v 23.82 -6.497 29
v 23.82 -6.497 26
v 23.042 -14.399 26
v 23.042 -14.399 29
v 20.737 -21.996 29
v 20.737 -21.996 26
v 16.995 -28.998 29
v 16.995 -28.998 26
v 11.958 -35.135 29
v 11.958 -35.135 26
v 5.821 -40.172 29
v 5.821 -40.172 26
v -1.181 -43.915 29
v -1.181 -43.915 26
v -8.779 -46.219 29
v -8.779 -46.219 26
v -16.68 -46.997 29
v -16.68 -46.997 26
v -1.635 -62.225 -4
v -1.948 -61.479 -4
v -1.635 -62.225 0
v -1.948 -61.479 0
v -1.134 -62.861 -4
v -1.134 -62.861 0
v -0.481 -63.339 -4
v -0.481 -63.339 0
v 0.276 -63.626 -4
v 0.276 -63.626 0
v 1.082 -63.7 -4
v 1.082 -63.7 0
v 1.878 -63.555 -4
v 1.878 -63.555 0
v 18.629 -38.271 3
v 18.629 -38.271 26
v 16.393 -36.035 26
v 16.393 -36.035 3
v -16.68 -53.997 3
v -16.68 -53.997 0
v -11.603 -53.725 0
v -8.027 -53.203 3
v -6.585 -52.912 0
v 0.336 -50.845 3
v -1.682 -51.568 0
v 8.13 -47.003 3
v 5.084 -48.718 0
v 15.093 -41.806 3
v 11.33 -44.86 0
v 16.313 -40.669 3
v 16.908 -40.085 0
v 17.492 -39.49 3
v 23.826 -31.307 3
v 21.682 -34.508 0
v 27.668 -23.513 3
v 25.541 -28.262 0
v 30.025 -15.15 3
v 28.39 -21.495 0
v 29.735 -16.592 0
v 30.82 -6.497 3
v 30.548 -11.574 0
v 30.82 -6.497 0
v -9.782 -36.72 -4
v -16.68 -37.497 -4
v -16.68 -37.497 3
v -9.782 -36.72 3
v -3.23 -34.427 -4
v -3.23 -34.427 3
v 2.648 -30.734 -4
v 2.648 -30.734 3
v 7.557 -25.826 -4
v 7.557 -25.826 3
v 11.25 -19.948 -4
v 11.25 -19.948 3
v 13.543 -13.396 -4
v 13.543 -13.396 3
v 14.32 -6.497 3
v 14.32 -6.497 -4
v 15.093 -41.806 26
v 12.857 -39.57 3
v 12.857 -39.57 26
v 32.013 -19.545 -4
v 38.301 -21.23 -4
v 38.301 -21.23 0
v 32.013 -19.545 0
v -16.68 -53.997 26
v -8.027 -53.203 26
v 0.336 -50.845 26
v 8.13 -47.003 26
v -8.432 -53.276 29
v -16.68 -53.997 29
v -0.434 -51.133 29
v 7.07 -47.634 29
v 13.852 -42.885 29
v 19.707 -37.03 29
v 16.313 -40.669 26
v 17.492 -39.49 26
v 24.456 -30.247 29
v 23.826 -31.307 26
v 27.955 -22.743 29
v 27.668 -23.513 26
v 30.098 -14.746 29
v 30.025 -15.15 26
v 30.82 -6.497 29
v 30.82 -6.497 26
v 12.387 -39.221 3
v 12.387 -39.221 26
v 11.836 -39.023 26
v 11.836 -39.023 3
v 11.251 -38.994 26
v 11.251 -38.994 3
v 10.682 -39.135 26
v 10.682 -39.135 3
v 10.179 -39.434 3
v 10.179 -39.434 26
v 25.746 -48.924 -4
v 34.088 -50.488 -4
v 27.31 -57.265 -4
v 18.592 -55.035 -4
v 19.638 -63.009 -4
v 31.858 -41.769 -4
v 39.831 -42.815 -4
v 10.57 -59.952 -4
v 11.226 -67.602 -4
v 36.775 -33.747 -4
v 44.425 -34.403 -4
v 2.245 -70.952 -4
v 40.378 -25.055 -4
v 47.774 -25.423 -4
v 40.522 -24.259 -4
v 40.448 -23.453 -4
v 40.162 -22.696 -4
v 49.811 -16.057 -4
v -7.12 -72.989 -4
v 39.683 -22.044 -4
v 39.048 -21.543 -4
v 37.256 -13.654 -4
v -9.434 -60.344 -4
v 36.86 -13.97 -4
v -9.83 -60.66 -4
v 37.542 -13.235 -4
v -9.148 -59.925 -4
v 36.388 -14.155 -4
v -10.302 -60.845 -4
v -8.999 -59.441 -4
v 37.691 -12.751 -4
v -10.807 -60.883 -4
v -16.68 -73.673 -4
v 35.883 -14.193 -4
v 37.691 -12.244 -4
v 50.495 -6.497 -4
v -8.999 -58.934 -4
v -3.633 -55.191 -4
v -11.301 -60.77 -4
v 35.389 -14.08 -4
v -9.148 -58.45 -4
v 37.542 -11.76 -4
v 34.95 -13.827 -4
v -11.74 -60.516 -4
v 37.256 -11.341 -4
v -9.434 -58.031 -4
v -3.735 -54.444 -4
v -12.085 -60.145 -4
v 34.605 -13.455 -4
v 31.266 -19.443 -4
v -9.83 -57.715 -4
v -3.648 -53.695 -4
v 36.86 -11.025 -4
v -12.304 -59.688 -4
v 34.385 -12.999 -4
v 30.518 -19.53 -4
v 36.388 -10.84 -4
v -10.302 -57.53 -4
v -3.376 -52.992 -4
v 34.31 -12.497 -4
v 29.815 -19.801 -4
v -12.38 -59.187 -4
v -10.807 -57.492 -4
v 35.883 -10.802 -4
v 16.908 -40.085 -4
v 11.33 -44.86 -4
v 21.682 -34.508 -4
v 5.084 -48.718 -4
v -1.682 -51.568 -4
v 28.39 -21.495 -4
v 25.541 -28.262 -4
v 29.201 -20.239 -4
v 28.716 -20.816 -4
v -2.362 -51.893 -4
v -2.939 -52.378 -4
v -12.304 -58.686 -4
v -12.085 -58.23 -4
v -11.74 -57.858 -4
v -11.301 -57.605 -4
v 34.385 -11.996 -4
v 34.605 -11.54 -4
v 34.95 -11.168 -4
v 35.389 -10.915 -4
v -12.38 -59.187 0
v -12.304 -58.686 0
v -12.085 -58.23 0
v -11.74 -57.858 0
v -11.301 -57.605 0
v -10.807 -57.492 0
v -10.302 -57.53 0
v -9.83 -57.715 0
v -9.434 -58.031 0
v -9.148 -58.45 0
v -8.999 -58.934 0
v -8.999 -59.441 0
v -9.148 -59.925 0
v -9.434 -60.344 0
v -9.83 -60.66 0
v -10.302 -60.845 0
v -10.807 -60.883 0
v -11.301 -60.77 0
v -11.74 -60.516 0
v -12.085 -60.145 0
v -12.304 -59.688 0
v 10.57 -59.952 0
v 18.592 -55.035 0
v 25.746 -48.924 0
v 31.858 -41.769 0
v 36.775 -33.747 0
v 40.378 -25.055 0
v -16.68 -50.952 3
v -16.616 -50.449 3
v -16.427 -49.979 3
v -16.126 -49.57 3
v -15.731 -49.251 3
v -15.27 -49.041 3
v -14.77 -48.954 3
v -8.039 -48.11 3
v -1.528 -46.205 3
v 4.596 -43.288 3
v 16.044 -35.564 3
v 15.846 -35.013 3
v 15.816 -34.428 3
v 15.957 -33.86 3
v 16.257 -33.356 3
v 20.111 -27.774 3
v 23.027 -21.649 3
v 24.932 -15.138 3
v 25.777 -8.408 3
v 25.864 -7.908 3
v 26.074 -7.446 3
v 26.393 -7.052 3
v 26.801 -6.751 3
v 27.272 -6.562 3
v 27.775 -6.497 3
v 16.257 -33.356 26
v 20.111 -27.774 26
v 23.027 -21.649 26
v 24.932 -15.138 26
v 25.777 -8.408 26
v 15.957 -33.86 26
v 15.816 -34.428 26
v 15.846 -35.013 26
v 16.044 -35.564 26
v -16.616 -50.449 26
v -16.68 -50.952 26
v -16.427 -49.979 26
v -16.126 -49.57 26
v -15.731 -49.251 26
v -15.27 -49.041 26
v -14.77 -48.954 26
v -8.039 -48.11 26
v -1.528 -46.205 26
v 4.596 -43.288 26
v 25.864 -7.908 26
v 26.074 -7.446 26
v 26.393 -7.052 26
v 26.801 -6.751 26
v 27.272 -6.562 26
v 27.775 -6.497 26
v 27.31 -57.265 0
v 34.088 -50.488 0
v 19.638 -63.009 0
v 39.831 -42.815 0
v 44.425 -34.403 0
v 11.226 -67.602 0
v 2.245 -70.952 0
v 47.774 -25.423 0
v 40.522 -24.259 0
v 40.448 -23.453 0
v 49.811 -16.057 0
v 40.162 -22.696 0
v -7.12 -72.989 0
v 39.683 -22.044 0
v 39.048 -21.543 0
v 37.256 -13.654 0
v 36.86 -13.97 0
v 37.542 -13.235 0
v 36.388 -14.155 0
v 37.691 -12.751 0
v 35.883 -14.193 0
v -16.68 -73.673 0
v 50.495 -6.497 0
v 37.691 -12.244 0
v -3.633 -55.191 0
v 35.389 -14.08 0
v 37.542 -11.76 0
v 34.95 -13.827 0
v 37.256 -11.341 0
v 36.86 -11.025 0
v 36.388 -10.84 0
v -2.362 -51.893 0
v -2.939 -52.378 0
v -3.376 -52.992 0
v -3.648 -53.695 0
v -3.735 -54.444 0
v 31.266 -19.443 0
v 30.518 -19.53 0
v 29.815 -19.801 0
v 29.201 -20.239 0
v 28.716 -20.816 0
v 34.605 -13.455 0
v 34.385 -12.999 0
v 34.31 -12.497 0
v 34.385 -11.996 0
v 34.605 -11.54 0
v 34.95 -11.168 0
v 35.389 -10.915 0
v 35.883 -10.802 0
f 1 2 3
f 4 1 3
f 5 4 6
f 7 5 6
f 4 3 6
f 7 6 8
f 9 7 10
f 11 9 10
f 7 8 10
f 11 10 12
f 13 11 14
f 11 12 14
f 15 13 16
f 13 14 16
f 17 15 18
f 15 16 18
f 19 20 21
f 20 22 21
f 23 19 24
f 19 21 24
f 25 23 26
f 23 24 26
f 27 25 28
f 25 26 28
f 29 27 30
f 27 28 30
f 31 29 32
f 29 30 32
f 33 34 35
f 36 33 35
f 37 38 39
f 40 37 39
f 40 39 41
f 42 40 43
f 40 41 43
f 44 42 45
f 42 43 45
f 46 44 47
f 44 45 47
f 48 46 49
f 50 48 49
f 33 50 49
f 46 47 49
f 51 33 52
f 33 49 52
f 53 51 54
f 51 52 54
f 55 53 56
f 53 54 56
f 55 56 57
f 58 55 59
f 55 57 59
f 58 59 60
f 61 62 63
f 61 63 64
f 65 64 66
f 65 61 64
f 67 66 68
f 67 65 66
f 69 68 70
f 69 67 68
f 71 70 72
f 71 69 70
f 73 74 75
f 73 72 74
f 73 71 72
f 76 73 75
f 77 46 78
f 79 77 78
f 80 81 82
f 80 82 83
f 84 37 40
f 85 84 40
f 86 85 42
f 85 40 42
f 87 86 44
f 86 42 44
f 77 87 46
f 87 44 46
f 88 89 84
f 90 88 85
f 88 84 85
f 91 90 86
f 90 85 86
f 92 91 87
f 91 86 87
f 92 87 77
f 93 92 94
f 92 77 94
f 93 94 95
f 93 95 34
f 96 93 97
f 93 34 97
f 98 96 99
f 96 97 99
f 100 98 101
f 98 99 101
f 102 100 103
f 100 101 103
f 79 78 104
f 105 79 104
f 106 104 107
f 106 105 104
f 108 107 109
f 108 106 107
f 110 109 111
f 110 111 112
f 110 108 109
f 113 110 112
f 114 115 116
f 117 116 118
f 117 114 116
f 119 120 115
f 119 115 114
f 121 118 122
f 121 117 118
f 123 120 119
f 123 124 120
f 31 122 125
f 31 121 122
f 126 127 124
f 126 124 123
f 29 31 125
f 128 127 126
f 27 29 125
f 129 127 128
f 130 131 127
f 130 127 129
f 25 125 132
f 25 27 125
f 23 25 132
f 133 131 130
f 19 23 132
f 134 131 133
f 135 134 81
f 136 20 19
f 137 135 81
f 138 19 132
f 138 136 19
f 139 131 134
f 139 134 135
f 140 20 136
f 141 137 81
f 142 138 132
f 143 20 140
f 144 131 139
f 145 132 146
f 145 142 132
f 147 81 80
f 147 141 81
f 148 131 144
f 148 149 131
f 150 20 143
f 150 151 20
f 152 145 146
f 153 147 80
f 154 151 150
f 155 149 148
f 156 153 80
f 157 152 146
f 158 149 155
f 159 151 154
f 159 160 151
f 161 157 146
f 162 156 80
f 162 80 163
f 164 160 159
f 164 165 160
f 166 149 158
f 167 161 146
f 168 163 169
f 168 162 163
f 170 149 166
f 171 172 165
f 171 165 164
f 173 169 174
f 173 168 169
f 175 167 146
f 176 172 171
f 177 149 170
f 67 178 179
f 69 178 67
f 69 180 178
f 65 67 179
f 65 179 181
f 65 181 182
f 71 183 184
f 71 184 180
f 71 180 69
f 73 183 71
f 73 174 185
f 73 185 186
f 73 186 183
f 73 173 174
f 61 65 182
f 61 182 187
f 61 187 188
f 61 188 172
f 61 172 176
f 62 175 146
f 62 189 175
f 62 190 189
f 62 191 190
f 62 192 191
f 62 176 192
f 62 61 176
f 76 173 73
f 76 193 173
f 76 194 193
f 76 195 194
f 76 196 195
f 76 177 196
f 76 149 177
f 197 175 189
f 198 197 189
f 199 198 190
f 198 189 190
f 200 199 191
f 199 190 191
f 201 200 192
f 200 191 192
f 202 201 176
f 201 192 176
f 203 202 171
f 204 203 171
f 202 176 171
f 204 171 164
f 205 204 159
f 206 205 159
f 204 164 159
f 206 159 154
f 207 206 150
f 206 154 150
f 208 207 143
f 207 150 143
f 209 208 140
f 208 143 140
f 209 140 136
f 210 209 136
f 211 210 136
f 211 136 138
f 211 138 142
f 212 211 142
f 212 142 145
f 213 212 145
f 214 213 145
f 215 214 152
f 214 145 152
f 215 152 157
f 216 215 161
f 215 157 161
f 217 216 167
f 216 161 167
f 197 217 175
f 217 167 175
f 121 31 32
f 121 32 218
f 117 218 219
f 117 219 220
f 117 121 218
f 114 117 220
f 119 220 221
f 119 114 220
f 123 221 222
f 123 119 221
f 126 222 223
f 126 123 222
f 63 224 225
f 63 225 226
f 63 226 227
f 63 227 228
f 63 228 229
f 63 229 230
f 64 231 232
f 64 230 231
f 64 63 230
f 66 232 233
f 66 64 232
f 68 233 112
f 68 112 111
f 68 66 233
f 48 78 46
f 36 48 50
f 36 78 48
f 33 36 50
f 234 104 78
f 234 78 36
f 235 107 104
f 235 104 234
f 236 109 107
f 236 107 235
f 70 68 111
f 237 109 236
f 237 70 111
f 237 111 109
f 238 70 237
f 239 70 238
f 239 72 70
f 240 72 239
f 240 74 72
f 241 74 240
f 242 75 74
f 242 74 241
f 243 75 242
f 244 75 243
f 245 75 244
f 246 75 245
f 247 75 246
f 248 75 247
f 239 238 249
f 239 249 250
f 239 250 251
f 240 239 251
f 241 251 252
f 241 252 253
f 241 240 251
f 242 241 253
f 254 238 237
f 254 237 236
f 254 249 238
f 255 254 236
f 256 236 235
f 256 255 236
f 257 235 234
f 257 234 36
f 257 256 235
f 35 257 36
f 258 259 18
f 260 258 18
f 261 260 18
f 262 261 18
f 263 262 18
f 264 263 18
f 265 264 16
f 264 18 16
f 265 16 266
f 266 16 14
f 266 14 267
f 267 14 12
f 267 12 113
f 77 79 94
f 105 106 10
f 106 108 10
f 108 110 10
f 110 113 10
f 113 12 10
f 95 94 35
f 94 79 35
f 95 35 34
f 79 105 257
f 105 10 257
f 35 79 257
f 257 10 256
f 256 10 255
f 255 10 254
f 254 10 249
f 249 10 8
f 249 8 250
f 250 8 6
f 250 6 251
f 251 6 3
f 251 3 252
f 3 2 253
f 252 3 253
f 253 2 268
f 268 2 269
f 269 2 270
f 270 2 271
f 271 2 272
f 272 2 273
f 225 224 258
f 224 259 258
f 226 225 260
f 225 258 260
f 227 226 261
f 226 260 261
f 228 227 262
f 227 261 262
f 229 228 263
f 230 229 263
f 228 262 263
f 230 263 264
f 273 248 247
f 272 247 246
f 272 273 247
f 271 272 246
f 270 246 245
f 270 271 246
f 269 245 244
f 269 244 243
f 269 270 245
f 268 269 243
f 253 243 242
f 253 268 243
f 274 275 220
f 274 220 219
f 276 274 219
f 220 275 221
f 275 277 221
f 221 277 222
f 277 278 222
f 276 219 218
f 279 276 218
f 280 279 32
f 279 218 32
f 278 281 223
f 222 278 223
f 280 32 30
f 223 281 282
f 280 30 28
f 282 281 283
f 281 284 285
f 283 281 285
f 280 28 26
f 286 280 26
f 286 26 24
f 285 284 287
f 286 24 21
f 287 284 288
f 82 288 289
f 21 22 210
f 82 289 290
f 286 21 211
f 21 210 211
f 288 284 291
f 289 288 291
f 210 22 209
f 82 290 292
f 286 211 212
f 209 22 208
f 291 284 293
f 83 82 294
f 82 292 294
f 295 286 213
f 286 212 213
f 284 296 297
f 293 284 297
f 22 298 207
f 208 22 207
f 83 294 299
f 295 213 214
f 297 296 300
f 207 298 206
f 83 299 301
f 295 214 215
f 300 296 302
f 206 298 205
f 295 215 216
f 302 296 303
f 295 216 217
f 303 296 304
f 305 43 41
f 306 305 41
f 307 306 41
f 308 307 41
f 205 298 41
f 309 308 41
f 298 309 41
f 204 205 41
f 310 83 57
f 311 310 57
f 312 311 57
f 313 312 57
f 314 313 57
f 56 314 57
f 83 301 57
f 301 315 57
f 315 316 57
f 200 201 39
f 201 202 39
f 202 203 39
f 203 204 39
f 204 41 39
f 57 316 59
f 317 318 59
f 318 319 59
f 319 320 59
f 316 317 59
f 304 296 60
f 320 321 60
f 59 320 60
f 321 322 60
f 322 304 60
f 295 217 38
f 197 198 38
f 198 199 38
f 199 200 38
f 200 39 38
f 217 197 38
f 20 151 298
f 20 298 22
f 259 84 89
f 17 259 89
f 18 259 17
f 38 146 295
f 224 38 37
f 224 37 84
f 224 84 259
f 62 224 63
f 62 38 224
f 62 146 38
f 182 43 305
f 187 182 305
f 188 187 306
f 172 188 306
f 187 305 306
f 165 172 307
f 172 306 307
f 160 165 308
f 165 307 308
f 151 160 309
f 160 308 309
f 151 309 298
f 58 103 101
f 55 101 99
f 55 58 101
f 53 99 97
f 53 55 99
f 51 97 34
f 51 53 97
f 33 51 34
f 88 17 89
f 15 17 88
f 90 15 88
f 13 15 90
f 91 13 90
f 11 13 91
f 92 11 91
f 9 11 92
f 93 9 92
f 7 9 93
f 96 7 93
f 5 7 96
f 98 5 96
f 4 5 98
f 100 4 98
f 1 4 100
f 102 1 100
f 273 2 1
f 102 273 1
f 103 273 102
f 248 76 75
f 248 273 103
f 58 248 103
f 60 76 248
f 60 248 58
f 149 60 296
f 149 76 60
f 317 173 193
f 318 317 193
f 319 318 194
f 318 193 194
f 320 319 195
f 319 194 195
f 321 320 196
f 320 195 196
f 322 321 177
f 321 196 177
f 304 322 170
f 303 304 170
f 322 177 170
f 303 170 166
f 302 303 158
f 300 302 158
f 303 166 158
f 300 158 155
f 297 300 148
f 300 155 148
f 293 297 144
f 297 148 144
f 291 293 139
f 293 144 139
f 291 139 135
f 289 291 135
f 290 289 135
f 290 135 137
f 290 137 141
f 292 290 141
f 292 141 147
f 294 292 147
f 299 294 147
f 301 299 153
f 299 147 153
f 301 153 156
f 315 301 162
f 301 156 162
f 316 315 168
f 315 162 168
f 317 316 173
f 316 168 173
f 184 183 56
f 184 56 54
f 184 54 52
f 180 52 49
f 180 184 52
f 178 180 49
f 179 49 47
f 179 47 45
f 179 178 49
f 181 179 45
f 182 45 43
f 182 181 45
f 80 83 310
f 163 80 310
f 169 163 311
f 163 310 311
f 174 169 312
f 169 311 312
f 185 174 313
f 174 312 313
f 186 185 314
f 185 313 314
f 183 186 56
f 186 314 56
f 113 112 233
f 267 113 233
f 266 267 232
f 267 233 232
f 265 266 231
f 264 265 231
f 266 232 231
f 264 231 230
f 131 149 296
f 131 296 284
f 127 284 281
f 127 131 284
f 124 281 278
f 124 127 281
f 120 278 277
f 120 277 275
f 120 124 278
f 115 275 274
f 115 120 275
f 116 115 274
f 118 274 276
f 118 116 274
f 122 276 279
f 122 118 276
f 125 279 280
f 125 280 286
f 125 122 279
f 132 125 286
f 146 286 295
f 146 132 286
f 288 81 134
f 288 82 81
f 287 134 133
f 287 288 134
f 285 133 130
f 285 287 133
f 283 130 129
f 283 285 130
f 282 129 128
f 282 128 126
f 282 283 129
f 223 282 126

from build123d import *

# Parameters (mm, degrees)
EXTRUDE_1_DEPTH = 3
EXTRUDE_2_DEPTH = 23
EXTRUDE_3_DEPTH = 3
FILLET_1_R      = 2
EXTRUDE_START   = 4
SKETCH_4_R      = 1.7
EXTRUDE_4_DEPTH = 4
FILLET_2_R      = 3


with BuildPart() as part:
    # 草图1 → 凸台-拉伸1 (new body)
    with BuildSketch(Plane.XY):
        with BuildLine():
            Line((-16.680000946, -37.497442229), (-16.680000946, -53.997442229))
            ThreePointArc((-16.680000946, -53.997442229), (16.90757116, -40.085014335), (30.819999054, -6.497442229))
            Line((30.819999054, -6.497442229), (14.319999054, -6.497442229))
            ThreePointArc((14.319999054, -6.497442229), (5.240309271, -28.417752446), (-16.680000946, -37.497442229))
        make_face()
    extrude(amount=EXTRUDE_1_DEPTH)

    # 草图2 → 凸台-拉伸2 (add)
    with BuildSketch(Plane.XY.offset(3)):
        with BuildLine():
            Line((-16.680000946, -48.997442229), (-16.680000946, -53.997442229))
            ThreePointArc((-16.680000946, -53.997442229), (0.33591272, -50.84503159), (15.093251764, -41.806228844))
            Line((15.093251764, -41.806228844), (11.552232101, -38.265209182))
            ThreePointArc((11.552232101, -38.265209182), (-1.578346989, -46.223882389), (-16.680000946, -48.997442229))
        make_face()
        with BuildLine():
            Line((25.819999054, -6.497442229), (30.819999054, -6.497442229))
            ThreePointArc((30.819999054, -6.497442229), (27.667588415, -23.513355895), (18.628785669, -38.270694938))
            Line((18.628785669, -38.270694938), (15.087766007, -34.729675276))
            ThreePointArc((15.087766007, -34.729675276), (23.046439214, -21.599096186), (25.819999054, -6.497442229))
        make_face()
    extrude(amount=EXTRUDE_2_DEPTH)

    # 草图3 → 凸台-拉伸3 (add)
    with BuildSketch(Plane.XY.offset(26)):
        with BuildLine():
            Line((-16.680000946, -46.997442229), (-16.680000946, -53.997442229))
            ThreePointArc((-16.680000946, -53.997442229), (16.90757116, -40.085014335), (30.819999054, -6.497442229))
            Line((30.819999054, -6.497442229), (23.819999054, -6.497442229))
            ThreePointArc((23.819999054, -6.497442229), (11.957823692, -35.135266867), (-16.680000946, -46.997442229))
        make_face()
    extrude(amount=EXTRUDE_3_DEPTH)

    # 圆角1
    fillet_1_edges = [part.edges().sort_by_distance(p)[0] for p in [
        (25.819999054, -6.497442229, 14.5),
        (15.087766007, -34.729675276, 14.5),
        (11.552232101, -38.265209182, 14.5),
        (-16.680000946, -48.997442229, 14.5),
    ]]
    fillet(fillet_1_edges, radius=FILLET_1_R)

    # 草图4 → 凸台-拉伸4 (add)
    with BuildSketch(Plane(origin=(0, 0, 0), x_dir=(-1, 0, 0), z_dir=(0, 0, -1)).offset(EXTRUDE_START)):
        with BuildLine():
            Line((16.680000946, -73.672586442), (16.680000946, -37.497442229))
            ThreePointArc((16.680000946, -37.497442229), (-5.240309271, -28.417752446), (-14.319999054, -6.497442229))
            Line((-14.319999054, -6.497442229), (-50.495143267, -6.497442229))
            ThreePointArc((-50.495143267, -6.497442229), (-30.819999054, -53.997442229), (16.680000946, -73.672586442))
        make_face()
        with Locations((10.680000946, -59.187305067)):
            Circle(SKETCH_4_R, mode=Mode.SUBTRACT)
        with Locations((-36.009861892, -12.497442229)):
            Circle(SKETCH_4_R, mode=Mode.SUBTRACT)
        with BuildLine():
            Line((-41.275548631, -22.026584935), (-29.201475803, -18.791346871))
            ThreePointArc((-29.201475803, -18.791346871), (-16.90757116, -40.085014335), (4.386096304, -52.378918978))
            Line((4.386096304, -52.378918978), (1.15085824, -64.452991806))
            ThreePointArc((1.15085824, -64.452991806), (-25.746405925, -48.9238491), (-41.275548631, -22.026584935))
        make_face(mode=Mode.SUBTRACT)
    extrude(amount=-EXTRUDE_4_DEPTH)

    # 圆角2
    fillet_2_edges = [part.edges().sort_by_distance(p)[0] for p in [
        (29.201475803, -18.791346871, -2),
        (41.275548631, -22.026584935, -2),
        (-1.15085824, -64.452991806, -2),
        (-4.386096304, -52.378918978, -2),
    ]]
    fillet(fillet_2_edges, radius=FILLET_2_R)


solid = part.part
